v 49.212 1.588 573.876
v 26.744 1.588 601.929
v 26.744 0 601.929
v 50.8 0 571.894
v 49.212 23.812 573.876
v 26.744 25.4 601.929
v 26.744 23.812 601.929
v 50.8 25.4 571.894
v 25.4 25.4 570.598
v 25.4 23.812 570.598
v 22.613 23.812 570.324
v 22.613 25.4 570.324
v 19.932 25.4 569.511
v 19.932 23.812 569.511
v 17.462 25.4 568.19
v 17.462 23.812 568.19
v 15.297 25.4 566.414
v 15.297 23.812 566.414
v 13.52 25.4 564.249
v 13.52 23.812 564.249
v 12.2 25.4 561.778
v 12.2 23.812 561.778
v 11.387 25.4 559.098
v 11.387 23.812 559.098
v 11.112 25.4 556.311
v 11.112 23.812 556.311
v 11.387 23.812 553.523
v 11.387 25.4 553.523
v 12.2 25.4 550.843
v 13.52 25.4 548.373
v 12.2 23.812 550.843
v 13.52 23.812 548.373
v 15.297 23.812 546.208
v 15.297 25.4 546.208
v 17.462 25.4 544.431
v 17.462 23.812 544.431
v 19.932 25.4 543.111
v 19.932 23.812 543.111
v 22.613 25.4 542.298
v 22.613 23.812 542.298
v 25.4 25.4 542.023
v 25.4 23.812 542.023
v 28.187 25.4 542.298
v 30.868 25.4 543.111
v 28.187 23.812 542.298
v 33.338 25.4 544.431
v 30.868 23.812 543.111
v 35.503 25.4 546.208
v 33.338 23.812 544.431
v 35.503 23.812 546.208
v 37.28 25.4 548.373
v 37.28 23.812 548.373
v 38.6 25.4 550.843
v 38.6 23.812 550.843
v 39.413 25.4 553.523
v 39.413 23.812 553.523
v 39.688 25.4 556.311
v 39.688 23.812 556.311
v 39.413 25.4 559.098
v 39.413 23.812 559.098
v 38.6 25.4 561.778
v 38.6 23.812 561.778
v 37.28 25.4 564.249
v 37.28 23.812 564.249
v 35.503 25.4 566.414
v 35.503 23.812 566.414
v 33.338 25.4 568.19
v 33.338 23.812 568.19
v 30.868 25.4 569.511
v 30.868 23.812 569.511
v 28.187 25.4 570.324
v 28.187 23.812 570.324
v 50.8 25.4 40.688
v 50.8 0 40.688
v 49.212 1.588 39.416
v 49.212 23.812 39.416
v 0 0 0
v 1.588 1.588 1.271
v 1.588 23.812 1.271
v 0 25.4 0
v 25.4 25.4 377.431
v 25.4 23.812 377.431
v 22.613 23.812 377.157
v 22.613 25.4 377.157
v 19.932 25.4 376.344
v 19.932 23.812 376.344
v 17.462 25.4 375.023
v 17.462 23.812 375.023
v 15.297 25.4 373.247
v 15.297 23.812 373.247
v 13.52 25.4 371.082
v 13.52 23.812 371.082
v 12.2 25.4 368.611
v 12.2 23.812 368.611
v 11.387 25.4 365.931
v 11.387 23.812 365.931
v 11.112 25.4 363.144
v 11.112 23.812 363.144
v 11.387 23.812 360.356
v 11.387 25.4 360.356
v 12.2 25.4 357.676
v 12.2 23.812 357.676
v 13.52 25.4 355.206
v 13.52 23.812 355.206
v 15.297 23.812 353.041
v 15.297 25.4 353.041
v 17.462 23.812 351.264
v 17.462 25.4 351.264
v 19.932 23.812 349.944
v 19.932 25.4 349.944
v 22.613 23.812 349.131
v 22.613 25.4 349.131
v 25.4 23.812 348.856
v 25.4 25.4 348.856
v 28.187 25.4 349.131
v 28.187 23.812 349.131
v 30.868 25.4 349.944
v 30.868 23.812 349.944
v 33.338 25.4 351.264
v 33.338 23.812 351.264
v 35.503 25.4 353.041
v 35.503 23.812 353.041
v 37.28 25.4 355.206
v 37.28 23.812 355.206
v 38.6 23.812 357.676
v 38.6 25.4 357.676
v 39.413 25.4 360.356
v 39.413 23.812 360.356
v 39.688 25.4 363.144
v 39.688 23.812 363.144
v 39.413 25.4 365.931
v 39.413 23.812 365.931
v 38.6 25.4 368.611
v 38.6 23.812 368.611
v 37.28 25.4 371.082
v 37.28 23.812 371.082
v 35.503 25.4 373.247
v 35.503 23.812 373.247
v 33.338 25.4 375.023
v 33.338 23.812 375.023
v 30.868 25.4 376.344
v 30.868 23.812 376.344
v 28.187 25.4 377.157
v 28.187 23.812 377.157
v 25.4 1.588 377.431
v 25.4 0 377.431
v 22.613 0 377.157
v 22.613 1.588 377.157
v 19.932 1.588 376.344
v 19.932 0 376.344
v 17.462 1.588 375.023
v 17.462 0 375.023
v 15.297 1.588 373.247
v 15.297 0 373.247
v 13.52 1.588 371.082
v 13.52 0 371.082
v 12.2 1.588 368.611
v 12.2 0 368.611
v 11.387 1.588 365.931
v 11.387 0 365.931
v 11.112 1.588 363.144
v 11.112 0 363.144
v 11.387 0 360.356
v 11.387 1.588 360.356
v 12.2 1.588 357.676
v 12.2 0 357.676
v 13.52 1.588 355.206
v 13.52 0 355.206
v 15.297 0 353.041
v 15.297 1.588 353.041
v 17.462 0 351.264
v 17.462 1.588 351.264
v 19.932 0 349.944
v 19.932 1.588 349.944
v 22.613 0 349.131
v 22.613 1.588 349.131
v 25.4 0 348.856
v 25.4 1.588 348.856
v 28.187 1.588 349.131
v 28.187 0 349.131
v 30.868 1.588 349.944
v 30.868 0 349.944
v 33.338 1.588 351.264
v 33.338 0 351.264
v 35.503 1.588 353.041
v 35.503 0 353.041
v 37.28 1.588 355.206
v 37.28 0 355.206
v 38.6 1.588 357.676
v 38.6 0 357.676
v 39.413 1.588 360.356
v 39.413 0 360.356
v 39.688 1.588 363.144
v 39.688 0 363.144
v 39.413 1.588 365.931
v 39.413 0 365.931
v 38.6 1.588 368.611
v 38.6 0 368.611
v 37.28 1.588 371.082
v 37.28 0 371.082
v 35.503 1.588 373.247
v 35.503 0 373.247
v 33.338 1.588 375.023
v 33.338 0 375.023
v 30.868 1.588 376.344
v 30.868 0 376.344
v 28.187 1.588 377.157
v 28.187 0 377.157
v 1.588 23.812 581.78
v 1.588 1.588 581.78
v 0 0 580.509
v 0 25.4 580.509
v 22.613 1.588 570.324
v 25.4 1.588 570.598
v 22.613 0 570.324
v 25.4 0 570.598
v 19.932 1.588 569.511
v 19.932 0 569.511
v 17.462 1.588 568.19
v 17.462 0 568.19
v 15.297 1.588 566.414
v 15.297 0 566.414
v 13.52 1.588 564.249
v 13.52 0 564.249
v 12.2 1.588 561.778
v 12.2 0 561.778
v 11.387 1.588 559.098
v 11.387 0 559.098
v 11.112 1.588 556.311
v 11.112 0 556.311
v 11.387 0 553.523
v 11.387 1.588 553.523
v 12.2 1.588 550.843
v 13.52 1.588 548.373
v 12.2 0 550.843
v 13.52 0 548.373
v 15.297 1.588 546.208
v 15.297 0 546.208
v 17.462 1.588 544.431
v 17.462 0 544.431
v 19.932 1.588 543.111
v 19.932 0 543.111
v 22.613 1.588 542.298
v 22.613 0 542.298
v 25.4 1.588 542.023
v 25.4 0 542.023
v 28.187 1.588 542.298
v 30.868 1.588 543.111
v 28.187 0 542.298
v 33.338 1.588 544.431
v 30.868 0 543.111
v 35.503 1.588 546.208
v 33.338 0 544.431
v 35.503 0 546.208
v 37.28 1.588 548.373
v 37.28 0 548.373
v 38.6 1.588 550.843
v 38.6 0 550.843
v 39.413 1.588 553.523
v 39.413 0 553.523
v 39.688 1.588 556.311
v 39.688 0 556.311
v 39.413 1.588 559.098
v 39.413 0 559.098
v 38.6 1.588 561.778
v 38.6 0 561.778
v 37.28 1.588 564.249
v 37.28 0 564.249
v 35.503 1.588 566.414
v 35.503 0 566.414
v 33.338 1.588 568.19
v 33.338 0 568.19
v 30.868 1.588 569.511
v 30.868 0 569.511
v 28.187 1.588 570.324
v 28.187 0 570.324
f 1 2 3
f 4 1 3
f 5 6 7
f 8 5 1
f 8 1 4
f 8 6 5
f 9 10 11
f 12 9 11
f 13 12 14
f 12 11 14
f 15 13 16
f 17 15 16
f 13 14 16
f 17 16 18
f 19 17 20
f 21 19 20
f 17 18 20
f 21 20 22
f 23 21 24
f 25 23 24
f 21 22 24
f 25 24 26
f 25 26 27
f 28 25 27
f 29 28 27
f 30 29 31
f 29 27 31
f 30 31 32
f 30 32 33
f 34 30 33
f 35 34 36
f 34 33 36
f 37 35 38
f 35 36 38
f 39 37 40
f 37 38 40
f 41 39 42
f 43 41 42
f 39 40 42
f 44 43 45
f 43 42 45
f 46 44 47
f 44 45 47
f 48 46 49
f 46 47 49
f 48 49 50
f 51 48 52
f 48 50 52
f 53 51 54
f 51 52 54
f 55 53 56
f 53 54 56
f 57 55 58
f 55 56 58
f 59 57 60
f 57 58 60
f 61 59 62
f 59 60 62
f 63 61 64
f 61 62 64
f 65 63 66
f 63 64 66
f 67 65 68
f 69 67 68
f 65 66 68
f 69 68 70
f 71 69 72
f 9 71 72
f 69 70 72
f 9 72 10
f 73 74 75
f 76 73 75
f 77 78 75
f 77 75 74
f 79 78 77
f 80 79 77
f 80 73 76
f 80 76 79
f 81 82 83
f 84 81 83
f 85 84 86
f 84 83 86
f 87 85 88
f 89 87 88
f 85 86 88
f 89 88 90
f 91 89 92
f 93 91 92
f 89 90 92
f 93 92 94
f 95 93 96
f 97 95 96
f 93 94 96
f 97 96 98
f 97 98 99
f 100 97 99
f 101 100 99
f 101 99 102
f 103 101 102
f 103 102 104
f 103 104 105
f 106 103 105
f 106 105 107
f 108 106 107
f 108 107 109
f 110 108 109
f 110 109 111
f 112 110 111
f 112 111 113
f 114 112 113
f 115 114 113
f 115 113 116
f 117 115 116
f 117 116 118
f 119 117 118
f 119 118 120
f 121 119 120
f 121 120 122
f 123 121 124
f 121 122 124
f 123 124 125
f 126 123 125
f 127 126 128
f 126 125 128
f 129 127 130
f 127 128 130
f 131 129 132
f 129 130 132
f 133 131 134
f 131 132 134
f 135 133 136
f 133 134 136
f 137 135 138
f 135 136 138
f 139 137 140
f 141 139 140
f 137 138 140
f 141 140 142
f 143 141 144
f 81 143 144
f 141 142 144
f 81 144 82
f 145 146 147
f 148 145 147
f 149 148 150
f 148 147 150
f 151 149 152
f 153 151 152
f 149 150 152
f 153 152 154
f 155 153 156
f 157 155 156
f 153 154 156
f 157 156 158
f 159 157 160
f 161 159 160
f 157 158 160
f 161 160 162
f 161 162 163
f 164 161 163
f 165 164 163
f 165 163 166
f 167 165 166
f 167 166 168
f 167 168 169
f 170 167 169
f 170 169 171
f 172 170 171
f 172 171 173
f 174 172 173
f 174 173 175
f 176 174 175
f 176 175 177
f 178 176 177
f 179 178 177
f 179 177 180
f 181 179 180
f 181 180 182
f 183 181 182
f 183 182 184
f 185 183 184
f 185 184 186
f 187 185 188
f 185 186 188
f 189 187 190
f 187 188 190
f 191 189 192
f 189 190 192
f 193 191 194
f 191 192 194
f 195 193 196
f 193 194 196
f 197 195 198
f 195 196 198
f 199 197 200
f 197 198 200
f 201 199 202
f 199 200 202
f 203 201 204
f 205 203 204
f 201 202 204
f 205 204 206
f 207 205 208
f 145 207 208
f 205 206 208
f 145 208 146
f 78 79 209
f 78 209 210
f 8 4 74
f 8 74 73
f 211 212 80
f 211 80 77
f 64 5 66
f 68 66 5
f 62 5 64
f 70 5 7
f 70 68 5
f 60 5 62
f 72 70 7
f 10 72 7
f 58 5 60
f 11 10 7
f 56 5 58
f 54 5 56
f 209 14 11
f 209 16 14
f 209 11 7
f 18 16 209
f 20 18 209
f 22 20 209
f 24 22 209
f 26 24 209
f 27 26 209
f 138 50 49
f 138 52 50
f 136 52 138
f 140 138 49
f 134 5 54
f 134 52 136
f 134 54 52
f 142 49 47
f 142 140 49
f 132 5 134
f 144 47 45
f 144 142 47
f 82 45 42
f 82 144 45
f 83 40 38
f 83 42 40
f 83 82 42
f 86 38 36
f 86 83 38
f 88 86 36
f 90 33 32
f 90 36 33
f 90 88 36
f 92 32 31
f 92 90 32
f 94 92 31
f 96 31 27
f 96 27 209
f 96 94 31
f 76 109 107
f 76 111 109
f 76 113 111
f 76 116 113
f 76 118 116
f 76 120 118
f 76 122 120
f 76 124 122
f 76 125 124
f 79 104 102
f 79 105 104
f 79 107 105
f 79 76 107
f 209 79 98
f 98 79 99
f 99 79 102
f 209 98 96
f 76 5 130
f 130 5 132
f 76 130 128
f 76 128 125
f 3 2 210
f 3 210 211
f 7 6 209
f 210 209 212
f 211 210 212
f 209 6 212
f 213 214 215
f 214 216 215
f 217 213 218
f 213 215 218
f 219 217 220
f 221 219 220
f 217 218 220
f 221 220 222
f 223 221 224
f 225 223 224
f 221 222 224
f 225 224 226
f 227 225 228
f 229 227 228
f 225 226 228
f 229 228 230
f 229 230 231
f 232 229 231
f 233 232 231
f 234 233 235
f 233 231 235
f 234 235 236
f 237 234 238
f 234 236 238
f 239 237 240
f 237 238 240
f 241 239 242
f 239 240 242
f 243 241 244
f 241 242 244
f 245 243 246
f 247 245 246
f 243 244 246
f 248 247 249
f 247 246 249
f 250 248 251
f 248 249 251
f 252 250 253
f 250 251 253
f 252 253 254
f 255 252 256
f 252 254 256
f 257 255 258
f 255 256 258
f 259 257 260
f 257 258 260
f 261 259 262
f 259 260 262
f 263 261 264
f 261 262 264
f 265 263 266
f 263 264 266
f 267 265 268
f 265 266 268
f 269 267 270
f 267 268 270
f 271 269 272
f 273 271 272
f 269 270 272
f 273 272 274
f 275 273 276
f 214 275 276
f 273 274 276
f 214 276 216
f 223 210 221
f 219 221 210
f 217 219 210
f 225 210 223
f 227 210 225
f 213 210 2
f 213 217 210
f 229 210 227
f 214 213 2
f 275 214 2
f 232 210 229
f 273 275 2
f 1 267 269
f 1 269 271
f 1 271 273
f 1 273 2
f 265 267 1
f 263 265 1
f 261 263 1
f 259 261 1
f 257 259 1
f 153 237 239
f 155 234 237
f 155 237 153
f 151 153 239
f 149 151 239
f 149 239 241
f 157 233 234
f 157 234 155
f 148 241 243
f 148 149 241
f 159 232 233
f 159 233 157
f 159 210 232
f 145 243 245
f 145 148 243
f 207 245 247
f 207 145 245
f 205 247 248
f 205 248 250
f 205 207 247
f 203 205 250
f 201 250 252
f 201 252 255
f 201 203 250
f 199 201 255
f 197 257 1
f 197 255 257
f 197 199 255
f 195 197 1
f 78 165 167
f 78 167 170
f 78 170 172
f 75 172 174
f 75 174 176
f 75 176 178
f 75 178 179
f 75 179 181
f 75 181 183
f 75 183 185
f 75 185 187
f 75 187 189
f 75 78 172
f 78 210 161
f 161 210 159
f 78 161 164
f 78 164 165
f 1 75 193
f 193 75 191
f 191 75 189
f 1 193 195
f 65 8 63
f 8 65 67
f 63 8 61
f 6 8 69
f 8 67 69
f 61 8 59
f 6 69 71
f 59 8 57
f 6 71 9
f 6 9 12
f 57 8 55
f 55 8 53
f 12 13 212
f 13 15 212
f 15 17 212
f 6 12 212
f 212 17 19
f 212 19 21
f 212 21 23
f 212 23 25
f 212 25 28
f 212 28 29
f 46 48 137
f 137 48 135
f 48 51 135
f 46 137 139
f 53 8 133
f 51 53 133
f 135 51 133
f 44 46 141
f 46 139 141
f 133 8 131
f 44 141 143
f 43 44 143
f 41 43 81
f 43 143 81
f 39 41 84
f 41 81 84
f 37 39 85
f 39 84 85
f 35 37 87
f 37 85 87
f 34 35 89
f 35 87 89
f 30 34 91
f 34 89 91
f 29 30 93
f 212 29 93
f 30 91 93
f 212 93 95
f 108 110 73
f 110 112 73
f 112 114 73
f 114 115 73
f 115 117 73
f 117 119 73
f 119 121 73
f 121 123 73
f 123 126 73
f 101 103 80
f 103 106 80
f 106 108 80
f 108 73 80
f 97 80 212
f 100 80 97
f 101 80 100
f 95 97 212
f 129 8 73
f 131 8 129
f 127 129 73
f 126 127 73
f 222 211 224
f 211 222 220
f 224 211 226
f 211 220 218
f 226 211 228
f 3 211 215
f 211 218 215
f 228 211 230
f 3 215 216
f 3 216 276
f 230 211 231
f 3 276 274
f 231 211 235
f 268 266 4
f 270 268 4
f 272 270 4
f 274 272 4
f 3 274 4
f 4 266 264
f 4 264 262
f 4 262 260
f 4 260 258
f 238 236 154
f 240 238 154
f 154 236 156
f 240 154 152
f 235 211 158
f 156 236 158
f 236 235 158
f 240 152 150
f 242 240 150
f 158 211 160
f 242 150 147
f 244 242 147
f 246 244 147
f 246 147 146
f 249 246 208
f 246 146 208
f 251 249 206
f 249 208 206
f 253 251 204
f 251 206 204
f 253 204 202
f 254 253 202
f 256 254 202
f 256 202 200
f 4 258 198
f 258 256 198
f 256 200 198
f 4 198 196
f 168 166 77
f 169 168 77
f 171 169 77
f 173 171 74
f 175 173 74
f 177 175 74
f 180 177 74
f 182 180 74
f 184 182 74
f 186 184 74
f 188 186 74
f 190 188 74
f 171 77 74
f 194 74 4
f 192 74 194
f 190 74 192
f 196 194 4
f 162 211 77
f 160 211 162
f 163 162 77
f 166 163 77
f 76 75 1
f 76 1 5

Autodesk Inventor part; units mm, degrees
ref_plane "YZ Plane" through (0, 0, 0) normal (1, 0, 0) x (0, 1, 0)
ref_plane "XZ Plane" through (0, 0, 0) normal (0, 1, 0) x (-1, 0, 0)
ref_plane "XY Plane" through (0, 0, 0) normal (0, 0, 1) x (1, 0, 0)
sketch "Sketch1" plane through (0, 0, 0) normal (0, 0, 1) x (1, 0, 0)
  line L0 (0, 0) -> (50.8, 0)
  line L1 (50.8, 0) -> (50.8, 25.4)
  line L2 (50.8, 25.4) -> (0, 25.4)
  line L3 (0, 25.4) -> (0, 0)
  line L4 (1.5875, 1.5875) -> (49.2125, 1.5875)
  line L5 (49.2125, 1.5875) -> (49.2125, 23.8125)
  line L6 (49.2125, 23.8125) -> (1.5875, 23.8125)
  line L7 (1.5875, 23.8125) -> (1.5875, 1.5875)
  dimension "d0" = 50.8
  dimension "d1" = 25.4
  dimension "d2" = 1.5875
extrude "Extrusion1" add sketch "Sketch1" along normal blind 601.9292
sketch "Sketch2" plane through (0, 25.4, 0) normal (0, 1, 0) x (1, 0, 0)
  line L0 (125.8687, -681.3224) -> (26.7439, -601.9292)
  line L1 (26.7439, -601.9292) -> (85.6181, -528.4229)
  line L2 (85.6181, -528.4229) -> (184.7429, -607.8161)
  line L3 (184.7429, -607.8161) -> (125.8687, -681.3224)
  line L4 (-52.6493, -701.054) -> (26.7439, -601.9292)
  line L5 (26.7439, -601.9292) -> (-41.6165, -547.1765)
  line L6 (-41.6165, -547.1765) -> (-121.0097, -646.3013)
  line L7 (-121.0097, -646.3013) -> (-52.6493, -701.054)
  line L8 (50.8, 0) -> (0, 0) projected
  line L9 (0, 0) -> (0, -601.9292) projected
  line L10 (50.8, -601.9292) -> (0, -601.9292) projected
  line L11 (50.8, 0) -> (50.8, -601.9292) projected
  line L12 (0, 0) -> (0, -601.9292) projected
  point P0 (50.8, -571.8944)
  point P1 (0, -580.5089)
  dimension "d6" = 127
  dimension "d7" = 127
  dimension "d9" = 38.481
  dimension "d16" = 34.2646
extrude "Extrusion2" cut sketch "Sketch2" against normal blind 25.4 contours L0 L10 L11 L1 L2 L3 | L10 L9 L5 | L1 L11 L10 | L4 L7 L6 L5 L9 L10
sketch "Sketch3" plane through (0, 25.4, 0) normal (0, 1, 0) x (1, 0, 0)
  line L0 (0, 0) -> (59.8042, 74.6674)
  line L1 (59.8042, 74.6674) -> (161.4042, -6.7083)
  line L2 (161.4042, -6.7083) -> (101.6, -81.3757)
  line L3 (101.6, -81.3757) -> (0, 0)
  line L4 (50.8, 0) -> (0, 0) projected
  line L5 (50.8, 0) -> (50.8, -571.8944) projected
  line L6 (0, -580.5089) -> (26.7439, -601.9292) projected
  point P0 (50.8, -40.6878)
extrude "Extrusion3" cut sketch "Sketch3" against normal blind 25.4 contours L4 L5 L3
sketch "Sketch4" plane through (0, 25.4, 580.5089) normal (0, 1, 0) x (1, 0, 0)
  line L0 (-37.1172, 580.5089) -> (145.2482, 580.5089) construction
  line L1 (0, 580.5089) -> (0, 0) construction
  point P0 (25.4, 217.3651)
  point P1 (25.4, 24.1981)
  point P2 (26.7439, -21.4203)
  dimension "d17" = 25.4
  dimension "d20" = 25.4
  dimension "d28" = 238.7854
  dimension "d29" = 45.6184
hole "Hole1" at (25.4, 25.4, 363.1438) at (25.4, 25.4, 556.3108) direction (0, -1, 0) diameter 28.575 depth 25.4 tip angle 118
ref_plane "Work Plane1" through (25.4, 0, 571.8944) normal (1, 0, 0) x (0, 0, -1)
properties part number "SUP_010_4BarBar" material "Aluminum 6061"
